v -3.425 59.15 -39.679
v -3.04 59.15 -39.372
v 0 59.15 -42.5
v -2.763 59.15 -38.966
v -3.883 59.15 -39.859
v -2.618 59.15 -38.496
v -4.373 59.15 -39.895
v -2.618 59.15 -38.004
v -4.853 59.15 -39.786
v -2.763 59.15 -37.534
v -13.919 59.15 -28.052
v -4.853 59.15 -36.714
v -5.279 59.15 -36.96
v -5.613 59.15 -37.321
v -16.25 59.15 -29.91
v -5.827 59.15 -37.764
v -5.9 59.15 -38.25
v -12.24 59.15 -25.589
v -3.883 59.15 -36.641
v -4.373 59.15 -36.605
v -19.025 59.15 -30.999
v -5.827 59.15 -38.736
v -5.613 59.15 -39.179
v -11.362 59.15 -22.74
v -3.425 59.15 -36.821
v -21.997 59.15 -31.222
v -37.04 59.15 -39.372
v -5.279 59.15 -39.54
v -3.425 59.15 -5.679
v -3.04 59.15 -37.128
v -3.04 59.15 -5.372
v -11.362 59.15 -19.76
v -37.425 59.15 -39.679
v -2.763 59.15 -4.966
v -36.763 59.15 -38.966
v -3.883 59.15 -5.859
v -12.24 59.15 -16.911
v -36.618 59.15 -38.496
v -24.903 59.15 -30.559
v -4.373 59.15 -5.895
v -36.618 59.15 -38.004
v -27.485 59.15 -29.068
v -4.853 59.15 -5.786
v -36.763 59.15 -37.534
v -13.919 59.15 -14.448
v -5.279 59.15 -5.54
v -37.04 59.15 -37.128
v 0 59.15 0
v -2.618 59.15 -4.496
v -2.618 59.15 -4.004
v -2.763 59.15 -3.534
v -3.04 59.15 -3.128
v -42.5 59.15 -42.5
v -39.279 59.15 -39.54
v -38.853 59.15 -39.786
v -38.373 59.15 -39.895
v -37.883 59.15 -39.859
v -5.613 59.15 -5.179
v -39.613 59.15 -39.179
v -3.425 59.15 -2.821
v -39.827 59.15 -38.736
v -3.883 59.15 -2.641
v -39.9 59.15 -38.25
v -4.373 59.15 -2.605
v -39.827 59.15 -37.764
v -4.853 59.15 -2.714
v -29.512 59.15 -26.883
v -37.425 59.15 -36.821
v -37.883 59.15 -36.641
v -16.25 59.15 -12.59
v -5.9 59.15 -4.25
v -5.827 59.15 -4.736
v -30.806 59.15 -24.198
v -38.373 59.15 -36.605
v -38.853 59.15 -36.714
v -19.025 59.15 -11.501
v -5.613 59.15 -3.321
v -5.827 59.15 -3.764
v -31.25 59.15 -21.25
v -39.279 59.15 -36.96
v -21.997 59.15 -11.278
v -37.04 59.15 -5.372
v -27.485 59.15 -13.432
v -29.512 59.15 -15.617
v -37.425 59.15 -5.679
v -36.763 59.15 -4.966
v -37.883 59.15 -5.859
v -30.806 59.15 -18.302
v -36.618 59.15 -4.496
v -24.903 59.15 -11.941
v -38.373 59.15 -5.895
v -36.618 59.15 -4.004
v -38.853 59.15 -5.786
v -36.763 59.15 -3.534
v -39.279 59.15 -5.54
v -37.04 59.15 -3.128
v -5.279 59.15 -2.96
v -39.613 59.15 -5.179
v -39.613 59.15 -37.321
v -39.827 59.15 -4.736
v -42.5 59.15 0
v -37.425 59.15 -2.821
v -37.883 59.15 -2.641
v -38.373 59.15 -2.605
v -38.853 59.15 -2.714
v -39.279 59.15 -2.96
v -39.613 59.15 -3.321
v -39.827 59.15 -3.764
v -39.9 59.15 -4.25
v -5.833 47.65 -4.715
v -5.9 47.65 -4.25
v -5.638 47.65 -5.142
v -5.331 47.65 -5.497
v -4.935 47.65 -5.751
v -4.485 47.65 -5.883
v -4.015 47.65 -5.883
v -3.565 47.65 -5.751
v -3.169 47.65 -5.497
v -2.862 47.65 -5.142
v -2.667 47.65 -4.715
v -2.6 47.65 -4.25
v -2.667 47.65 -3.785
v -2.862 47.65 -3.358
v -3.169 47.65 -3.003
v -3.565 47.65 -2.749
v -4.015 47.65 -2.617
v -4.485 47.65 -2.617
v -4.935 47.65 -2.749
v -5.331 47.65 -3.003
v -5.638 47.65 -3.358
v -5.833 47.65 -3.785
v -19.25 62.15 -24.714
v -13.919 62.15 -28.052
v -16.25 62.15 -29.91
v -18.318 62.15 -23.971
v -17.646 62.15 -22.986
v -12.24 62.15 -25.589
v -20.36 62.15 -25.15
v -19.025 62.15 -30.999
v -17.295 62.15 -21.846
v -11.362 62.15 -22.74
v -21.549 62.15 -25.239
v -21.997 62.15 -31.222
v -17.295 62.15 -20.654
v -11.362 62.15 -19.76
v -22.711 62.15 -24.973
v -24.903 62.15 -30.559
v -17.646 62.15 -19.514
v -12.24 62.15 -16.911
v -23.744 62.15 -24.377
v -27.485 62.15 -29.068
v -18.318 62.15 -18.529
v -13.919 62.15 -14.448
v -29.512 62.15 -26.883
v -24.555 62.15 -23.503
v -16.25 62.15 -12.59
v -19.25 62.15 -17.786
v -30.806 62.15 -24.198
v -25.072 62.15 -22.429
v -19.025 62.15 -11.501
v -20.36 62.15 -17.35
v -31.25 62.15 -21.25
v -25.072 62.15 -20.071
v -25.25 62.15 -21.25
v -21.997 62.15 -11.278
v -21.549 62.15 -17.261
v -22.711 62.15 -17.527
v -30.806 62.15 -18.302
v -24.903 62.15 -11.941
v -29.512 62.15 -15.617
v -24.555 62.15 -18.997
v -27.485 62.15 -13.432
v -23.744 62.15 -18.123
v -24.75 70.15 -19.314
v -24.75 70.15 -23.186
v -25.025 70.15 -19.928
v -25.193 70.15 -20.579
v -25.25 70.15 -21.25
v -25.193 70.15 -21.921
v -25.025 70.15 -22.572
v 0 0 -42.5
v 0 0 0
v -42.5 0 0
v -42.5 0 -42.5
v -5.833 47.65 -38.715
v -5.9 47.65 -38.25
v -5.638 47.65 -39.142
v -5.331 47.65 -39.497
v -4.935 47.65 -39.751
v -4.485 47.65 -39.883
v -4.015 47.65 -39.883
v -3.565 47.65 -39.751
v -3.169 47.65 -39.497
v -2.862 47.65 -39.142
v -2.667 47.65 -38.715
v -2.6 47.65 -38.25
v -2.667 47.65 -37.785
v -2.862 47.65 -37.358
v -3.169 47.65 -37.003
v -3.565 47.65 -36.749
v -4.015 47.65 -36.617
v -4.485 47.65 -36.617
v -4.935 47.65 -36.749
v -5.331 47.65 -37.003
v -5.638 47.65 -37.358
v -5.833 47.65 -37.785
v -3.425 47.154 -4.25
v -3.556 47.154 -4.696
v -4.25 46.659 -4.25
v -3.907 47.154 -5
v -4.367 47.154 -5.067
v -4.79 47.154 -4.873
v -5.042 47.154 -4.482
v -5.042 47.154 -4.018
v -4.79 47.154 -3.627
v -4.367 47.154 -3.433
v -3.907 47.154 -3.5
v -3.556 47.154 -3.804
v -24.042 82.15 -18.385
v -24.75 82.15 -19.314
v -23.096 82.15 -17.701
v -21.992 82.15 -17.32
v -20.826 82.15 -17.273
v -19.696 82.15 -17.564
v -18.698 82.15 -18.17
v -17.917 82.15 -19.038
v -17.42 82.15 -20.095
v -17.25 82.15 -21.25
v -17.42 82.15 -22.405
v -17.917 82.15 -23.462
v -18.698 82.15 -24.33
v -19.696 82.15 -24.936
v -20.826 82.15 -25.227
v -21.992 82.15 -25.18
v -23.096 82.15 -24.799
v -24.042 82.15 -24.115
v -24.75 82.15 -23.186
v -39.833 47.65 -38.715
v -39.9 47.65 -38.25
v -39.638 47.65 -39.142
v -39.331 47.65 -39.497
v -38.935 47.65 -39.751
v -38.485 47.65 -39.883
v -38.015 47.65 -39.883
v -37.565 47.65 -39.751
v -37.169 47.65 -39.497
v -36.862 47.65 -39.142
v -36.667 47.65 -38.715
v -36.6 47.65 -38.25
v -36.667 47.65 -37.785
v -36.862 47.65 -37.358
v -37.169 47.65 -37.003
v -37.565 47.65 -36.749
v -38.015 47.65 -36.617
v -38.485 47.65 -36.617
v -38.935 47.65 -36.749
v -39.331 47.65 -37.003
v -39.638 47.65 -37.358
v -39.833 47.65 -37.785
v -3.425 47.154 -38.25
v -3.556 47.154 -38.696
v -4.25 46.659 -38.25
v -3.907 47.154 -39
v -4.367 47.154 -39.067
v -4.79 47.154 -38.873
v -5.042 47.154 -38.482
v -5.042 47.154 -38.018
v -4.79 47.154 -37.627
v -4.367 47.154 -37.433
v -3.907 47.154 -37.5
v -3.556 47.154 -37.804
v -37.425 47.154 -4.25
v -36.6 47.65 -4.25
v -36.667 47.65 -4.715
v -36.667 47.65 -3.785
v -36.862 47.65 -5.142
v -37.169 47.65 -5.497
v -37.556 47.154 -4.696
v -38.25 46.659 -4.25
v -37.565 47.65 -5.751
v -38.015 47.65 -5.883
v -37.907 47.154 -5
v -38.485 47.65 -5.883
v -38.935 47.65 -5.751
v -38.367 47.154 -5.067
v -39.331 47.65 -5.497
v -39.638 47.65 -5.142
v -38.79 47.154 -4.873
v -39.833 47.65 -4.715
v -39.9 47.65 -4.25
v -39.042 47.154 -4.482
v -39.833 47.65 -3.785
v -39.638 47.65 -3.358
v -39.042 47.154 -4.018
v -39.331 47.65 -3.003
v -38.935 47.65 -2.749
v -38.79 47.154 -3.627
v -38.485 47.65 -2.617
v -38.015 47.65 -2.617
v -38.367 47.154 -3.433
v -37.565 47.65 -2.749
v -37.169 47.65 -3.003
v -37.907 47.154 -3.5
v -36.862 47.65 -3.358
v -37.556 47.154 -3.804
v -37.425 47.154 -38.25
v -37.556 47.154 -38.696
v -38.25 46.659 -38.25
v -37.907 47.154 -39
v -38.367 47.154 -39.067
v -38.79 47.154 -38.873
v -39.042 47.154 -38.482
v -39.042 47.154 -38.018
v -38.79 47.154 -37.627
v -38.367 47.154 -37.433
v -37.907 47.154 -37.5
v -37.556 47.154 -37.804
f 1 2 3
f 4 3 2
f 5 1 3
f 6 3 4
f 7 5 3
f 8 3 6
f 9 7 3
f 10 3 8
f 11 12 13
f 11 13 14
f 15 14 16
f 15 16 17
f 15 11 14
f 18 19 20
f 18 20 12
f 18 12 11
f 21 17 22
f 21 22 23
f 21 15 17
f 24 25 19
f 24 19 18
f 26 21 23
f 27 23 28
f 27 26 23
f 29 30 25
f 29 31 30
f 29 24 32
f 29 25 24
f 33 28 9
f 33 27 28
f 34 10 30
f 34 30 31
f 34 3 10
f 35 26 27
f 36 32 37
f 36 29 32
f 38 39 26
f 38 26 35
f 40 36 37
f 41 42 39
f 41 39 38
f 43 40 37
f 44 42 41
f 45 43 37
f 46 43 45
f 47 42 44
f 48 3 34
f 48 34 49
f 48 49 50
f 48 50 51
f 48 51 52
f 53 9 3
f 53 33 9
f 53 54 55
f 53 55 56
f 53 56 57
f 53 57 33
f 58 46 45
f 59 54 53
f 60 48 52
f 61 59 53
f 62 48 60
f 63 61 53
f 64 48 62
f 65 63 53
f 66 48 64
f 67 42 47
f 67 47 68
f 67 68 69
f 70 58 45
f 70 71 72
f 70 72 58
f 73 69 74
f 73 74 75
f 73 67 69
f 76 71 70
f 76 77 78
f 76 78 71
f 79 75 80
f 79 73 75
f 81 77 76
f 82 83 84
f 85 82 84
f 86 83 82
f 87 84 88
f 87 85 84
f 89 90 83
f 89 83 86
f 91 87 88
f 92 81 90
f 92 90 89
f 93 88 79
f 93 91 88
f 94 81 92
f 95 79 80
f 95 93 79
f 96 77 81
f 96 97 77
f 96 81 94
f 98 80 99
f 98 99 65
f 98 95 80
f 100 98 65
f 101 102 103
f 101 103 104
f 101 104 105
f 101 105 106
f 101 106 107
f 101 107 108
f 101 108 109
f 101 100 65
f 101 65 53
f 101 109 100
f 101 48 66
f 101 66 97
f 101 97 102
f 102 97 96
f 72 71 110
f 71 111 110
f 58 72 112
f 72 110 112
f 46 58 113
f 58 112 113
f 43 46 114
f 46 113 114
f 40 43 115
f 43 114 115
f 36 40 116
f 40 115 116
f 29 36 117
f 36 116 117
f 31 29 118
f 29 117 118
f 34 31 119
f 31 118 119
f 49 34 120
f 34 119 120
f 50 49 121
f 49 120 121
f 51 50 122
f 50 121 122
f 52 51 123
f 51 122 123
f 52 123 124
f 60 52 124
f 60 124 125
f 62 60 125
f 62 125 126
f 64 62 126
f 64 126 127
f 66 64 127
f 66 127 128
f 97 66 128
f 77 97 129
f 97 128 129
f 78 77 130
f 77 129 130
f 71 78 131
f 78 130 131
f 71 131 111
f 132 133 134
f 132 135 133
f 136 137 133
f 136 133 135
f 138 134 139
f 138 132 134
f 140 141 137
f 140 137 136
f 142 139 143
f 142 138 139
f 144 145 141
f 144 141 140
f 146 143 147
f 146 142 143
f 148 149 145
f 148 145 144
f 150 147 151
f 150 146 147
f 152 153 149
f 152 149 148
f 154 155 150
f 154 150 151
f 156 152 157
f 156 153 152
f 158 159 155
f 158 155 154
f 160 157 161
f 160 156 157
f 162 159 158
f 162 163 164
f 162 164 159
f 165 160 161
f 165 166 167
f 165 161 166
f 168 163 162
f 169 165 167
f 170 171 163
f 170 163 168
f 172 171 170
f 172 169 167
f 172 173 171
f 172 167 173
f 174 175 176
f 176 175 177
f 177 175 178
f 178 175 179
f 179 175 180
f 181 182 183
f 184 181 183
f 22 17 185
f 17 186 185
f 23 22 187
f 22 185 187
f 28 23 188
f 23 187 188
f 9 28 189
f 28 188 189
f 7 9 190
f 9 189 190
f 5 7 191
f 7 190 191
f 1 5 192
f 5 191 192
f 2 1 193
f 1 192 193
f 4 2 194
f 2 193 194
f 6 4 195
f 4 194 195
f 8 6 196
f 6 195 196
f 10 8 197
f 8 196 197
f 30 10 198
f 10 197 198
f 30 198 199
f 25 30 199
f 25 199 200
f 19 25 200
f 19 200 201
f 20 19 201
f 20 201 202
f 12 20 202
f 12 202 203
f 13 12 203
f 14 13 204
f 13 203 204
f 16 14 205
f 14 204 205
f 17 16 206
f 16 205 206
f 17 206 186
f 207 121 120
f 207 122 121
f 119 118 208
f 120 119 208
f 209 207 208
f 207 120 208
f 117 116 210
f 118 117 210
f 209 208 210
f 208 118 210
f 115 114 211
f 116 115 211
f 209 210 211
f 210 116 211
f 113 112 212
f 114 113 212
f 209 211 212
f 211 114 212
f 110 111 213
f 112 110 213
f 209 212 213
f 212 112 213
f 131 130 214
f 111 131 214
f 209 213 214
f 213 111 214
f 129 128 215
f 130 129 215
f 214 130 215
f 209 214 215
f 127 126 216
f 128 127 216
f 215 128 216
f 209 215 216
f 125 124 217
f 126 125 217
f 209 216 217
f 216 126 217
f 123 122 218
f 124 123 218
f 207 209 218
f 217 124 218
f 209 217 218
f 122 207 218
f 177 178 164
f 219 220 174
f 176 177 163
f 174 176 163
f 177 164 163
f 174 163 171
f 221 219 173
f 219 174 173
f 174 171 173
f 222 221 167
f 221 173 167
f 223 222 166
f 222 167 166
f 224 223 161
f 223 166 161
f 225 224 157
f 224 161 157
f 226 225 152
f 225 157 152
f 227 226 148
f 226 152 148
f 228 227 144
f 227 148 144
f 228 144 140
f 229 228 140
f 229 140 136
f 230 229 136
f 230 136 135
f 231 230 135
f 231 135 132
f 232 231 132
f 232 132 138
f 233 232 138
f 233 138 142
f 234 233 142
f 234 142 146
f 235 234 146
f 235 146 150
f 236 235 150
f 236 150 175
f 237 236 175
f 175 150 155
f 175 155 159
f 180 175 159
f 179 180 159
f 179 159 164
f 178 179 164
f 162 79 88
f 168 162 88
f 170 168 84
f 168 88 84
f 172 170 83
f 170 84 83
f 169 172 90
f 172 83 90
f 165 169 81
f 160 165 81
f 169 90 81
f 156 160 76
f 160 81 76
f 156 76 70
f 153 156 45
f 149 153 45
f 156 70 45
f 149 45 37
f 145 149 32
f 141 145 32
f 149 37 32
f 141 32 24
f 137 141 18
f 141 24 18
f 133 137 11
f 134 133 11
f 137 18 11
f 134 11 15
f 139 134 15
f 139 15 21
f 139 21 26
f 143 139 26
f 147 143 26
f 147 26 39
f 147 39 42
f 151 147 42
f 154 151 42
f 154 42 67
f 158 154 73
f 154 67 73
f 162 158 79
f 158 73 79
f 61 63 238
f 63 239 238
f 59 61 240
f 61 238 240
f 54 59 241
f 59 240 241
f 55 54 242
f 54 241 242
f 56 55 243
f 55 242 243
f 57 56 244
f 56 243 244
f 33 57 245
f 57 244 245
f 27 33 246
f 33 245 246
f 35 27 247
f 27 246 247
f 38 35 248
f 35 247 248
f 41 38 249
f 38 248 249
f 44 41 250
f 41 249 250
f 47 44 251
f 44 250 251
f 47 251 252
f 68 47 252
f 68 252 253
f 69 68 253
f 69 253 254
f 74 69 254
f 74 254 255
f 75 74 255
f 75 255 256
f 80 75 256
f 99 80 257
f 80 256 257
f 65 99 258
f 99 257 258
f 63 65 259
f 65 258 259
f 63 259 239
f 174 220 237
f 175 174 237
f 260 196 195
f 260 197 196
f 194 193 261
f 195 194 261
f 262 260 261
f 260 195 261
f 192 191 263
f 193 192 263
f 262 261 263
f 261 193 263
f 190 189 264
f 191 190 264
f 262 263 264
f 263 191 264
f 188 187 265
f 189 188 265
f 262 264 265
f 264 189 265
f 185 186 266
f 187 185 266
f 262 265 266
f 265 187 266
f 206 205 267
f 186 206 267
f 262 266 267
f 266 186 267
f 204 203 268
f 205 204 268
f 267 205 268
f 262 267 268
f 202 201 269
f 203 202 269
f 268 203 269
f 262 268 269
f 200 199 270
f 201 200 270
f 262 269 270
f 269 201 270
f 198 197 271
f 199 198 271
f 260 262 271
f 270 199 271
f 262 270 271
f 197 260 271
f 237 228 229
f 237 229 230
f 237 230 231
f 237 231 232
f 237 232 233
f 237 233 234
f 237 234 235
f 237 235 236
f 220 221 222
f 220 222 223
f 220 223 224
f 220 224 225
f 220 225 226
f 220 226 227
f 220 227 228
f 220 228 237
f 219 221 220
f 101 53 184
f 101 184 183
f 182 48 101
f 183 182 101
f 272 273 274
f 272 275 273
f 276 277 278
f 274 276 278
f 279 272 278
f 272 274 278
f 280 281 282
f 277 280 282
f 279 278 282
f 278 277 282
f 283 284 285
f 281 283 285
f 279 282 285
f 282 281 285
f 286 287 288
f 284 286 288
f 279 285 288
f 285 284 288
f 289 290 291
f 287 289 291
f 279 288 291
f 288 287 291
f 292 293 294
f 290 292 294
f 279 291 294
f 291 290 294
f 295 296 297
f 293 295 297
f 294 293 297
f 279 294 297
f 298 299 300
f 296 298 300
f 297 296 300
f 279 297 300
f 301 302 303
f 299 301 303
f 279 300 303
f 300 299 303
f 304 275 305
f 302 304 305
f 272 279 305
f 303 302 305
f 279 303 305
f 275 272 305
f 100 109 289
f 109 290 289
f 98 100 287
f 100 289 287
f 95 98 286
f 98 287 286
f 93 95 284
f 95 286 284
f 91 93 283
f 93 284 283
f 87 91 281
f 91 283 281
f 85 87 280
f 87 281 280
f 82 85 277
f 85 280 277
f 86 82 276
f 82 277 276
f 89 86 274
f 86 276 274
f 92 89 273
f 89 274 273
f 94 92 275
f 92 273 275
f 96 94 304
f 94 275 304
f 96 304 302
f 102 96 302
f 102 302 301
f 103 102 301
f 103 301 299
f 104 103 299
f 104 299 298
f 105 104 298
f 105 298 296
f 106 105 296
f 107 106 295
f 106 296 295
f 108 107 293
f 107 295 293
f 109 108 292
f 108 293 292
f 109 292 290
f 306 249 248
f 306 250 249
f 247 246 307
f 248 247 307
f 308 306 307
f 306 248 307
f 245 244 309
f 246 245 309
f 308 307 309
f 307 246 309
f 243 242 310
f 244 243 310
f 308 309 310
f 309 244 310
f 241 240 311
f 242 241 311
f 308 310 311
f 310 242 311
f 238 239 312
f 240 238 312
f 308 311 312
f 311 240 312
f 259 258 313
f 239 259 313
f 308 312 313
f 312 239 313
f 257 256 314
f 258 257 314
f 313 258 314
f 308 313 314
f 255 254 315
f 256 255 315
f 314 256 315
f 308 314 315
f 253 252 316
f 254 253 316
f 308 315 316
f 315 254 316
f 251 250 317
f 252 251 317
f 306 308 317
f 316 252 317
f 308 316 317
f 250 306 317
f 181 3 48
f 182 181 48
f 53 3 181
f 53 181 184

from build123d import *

# Parameters (mm, degrees)
SKETCH_1_W          = 42.5
SKETCH_1_H          = 42.5
EXTRUDE_1_DEPTH     = 59.15
SKETCH_2_R          = 10
EXTRUDE_2_DEPTH     = 3
SKETCH_3_R          = 4
EXTRUDE_3_DEPTH     = 20
HOLE_WIZARD_3_D     = 3.3
HOLE_WIZARD_3_DEPTH = 11.5
HOLE_WIZARD_3_TIP   = 0.991420021
EXTRUDE_4_DEPTH     = 12


with BuildPart() as part:
    # 스케치1 → 돌출1 (new body)
    with BuildSketch(Plane(origin=(0, 0, 0), x_dir=(-1, 0, 0), z_dir=(0, 1, 0))):
        with Locations((21.25, -21.25)):
            Rectangle(SKETCH_1_W, SKETCH_1_H)
    extrude(amount=EXTRUDE_1_DEPTH)

    # 스케치2 → 돌출2 (add)
    with BuildSketch(Plane(origin=(0, 59.15, 0), x_dir=(-1, 0, 0), z_dir=(0, 1, 0))):
        with Locations((21.25, -21.25)):
            Circle(SKETCH_2_R)
    extrude(amount=EXTRUDE_2_DEPTH)

    # 스케치3 → 돌출3 (add)
    with BuildSketch(Plane(origin=(0, 62.15, 0), x_dir=(-1, 0, 0), z_dir=(0, 1, 0))):
        with Locations((21.25, -21.25)):
            Circle(SKETCH_3_R)
    extrude(amount=EXTRUDE_3_DEPTH)

    # 구멍3
    with Locations(Plane(origin=(0, 59.15, 0), x_dir=(1, 0, 0), z_dir=(0, 1, 0))):
        with Locations((-4.25, 38.25), (-4.25, 4.25), (-38.25, 4.25), (-38.25, 38.25)):
            Hole(HOLE_WIZARD_3_D / 2, depth=HOLE_WIZARD_3_DEPTH)
            with Locations((0, 0, -(HOLE_WIZARD_3_DEPTH + HOLE_WIZARD_3_TIP / 2))):  # 118° drill point
                Cone(0, HOLE_WIZARD_3_D / 2, HOLE_WIZARD_3_TIP, mode=Mode.SUBTRACT)

    # 스케치6 → 돌출4 (cut)
    with BuildSketch(Plane(origin=(0, 82.15, 0), x_dir=(-1, 0, 0), z_dir=(0, 1, 0))):
        with BuildLine():
            Line((24.75, -19.313508327), (24.75, -23.186491673))
            ThreePointArc((24.75, -23.186491673), (25.25, -21.25), (24.75, -19.313508327))
        make_face()
    extrude(amount=-EXTRUDE_4_DEPTH, mode=Mode.SUBTRACT)


solid = part.part
